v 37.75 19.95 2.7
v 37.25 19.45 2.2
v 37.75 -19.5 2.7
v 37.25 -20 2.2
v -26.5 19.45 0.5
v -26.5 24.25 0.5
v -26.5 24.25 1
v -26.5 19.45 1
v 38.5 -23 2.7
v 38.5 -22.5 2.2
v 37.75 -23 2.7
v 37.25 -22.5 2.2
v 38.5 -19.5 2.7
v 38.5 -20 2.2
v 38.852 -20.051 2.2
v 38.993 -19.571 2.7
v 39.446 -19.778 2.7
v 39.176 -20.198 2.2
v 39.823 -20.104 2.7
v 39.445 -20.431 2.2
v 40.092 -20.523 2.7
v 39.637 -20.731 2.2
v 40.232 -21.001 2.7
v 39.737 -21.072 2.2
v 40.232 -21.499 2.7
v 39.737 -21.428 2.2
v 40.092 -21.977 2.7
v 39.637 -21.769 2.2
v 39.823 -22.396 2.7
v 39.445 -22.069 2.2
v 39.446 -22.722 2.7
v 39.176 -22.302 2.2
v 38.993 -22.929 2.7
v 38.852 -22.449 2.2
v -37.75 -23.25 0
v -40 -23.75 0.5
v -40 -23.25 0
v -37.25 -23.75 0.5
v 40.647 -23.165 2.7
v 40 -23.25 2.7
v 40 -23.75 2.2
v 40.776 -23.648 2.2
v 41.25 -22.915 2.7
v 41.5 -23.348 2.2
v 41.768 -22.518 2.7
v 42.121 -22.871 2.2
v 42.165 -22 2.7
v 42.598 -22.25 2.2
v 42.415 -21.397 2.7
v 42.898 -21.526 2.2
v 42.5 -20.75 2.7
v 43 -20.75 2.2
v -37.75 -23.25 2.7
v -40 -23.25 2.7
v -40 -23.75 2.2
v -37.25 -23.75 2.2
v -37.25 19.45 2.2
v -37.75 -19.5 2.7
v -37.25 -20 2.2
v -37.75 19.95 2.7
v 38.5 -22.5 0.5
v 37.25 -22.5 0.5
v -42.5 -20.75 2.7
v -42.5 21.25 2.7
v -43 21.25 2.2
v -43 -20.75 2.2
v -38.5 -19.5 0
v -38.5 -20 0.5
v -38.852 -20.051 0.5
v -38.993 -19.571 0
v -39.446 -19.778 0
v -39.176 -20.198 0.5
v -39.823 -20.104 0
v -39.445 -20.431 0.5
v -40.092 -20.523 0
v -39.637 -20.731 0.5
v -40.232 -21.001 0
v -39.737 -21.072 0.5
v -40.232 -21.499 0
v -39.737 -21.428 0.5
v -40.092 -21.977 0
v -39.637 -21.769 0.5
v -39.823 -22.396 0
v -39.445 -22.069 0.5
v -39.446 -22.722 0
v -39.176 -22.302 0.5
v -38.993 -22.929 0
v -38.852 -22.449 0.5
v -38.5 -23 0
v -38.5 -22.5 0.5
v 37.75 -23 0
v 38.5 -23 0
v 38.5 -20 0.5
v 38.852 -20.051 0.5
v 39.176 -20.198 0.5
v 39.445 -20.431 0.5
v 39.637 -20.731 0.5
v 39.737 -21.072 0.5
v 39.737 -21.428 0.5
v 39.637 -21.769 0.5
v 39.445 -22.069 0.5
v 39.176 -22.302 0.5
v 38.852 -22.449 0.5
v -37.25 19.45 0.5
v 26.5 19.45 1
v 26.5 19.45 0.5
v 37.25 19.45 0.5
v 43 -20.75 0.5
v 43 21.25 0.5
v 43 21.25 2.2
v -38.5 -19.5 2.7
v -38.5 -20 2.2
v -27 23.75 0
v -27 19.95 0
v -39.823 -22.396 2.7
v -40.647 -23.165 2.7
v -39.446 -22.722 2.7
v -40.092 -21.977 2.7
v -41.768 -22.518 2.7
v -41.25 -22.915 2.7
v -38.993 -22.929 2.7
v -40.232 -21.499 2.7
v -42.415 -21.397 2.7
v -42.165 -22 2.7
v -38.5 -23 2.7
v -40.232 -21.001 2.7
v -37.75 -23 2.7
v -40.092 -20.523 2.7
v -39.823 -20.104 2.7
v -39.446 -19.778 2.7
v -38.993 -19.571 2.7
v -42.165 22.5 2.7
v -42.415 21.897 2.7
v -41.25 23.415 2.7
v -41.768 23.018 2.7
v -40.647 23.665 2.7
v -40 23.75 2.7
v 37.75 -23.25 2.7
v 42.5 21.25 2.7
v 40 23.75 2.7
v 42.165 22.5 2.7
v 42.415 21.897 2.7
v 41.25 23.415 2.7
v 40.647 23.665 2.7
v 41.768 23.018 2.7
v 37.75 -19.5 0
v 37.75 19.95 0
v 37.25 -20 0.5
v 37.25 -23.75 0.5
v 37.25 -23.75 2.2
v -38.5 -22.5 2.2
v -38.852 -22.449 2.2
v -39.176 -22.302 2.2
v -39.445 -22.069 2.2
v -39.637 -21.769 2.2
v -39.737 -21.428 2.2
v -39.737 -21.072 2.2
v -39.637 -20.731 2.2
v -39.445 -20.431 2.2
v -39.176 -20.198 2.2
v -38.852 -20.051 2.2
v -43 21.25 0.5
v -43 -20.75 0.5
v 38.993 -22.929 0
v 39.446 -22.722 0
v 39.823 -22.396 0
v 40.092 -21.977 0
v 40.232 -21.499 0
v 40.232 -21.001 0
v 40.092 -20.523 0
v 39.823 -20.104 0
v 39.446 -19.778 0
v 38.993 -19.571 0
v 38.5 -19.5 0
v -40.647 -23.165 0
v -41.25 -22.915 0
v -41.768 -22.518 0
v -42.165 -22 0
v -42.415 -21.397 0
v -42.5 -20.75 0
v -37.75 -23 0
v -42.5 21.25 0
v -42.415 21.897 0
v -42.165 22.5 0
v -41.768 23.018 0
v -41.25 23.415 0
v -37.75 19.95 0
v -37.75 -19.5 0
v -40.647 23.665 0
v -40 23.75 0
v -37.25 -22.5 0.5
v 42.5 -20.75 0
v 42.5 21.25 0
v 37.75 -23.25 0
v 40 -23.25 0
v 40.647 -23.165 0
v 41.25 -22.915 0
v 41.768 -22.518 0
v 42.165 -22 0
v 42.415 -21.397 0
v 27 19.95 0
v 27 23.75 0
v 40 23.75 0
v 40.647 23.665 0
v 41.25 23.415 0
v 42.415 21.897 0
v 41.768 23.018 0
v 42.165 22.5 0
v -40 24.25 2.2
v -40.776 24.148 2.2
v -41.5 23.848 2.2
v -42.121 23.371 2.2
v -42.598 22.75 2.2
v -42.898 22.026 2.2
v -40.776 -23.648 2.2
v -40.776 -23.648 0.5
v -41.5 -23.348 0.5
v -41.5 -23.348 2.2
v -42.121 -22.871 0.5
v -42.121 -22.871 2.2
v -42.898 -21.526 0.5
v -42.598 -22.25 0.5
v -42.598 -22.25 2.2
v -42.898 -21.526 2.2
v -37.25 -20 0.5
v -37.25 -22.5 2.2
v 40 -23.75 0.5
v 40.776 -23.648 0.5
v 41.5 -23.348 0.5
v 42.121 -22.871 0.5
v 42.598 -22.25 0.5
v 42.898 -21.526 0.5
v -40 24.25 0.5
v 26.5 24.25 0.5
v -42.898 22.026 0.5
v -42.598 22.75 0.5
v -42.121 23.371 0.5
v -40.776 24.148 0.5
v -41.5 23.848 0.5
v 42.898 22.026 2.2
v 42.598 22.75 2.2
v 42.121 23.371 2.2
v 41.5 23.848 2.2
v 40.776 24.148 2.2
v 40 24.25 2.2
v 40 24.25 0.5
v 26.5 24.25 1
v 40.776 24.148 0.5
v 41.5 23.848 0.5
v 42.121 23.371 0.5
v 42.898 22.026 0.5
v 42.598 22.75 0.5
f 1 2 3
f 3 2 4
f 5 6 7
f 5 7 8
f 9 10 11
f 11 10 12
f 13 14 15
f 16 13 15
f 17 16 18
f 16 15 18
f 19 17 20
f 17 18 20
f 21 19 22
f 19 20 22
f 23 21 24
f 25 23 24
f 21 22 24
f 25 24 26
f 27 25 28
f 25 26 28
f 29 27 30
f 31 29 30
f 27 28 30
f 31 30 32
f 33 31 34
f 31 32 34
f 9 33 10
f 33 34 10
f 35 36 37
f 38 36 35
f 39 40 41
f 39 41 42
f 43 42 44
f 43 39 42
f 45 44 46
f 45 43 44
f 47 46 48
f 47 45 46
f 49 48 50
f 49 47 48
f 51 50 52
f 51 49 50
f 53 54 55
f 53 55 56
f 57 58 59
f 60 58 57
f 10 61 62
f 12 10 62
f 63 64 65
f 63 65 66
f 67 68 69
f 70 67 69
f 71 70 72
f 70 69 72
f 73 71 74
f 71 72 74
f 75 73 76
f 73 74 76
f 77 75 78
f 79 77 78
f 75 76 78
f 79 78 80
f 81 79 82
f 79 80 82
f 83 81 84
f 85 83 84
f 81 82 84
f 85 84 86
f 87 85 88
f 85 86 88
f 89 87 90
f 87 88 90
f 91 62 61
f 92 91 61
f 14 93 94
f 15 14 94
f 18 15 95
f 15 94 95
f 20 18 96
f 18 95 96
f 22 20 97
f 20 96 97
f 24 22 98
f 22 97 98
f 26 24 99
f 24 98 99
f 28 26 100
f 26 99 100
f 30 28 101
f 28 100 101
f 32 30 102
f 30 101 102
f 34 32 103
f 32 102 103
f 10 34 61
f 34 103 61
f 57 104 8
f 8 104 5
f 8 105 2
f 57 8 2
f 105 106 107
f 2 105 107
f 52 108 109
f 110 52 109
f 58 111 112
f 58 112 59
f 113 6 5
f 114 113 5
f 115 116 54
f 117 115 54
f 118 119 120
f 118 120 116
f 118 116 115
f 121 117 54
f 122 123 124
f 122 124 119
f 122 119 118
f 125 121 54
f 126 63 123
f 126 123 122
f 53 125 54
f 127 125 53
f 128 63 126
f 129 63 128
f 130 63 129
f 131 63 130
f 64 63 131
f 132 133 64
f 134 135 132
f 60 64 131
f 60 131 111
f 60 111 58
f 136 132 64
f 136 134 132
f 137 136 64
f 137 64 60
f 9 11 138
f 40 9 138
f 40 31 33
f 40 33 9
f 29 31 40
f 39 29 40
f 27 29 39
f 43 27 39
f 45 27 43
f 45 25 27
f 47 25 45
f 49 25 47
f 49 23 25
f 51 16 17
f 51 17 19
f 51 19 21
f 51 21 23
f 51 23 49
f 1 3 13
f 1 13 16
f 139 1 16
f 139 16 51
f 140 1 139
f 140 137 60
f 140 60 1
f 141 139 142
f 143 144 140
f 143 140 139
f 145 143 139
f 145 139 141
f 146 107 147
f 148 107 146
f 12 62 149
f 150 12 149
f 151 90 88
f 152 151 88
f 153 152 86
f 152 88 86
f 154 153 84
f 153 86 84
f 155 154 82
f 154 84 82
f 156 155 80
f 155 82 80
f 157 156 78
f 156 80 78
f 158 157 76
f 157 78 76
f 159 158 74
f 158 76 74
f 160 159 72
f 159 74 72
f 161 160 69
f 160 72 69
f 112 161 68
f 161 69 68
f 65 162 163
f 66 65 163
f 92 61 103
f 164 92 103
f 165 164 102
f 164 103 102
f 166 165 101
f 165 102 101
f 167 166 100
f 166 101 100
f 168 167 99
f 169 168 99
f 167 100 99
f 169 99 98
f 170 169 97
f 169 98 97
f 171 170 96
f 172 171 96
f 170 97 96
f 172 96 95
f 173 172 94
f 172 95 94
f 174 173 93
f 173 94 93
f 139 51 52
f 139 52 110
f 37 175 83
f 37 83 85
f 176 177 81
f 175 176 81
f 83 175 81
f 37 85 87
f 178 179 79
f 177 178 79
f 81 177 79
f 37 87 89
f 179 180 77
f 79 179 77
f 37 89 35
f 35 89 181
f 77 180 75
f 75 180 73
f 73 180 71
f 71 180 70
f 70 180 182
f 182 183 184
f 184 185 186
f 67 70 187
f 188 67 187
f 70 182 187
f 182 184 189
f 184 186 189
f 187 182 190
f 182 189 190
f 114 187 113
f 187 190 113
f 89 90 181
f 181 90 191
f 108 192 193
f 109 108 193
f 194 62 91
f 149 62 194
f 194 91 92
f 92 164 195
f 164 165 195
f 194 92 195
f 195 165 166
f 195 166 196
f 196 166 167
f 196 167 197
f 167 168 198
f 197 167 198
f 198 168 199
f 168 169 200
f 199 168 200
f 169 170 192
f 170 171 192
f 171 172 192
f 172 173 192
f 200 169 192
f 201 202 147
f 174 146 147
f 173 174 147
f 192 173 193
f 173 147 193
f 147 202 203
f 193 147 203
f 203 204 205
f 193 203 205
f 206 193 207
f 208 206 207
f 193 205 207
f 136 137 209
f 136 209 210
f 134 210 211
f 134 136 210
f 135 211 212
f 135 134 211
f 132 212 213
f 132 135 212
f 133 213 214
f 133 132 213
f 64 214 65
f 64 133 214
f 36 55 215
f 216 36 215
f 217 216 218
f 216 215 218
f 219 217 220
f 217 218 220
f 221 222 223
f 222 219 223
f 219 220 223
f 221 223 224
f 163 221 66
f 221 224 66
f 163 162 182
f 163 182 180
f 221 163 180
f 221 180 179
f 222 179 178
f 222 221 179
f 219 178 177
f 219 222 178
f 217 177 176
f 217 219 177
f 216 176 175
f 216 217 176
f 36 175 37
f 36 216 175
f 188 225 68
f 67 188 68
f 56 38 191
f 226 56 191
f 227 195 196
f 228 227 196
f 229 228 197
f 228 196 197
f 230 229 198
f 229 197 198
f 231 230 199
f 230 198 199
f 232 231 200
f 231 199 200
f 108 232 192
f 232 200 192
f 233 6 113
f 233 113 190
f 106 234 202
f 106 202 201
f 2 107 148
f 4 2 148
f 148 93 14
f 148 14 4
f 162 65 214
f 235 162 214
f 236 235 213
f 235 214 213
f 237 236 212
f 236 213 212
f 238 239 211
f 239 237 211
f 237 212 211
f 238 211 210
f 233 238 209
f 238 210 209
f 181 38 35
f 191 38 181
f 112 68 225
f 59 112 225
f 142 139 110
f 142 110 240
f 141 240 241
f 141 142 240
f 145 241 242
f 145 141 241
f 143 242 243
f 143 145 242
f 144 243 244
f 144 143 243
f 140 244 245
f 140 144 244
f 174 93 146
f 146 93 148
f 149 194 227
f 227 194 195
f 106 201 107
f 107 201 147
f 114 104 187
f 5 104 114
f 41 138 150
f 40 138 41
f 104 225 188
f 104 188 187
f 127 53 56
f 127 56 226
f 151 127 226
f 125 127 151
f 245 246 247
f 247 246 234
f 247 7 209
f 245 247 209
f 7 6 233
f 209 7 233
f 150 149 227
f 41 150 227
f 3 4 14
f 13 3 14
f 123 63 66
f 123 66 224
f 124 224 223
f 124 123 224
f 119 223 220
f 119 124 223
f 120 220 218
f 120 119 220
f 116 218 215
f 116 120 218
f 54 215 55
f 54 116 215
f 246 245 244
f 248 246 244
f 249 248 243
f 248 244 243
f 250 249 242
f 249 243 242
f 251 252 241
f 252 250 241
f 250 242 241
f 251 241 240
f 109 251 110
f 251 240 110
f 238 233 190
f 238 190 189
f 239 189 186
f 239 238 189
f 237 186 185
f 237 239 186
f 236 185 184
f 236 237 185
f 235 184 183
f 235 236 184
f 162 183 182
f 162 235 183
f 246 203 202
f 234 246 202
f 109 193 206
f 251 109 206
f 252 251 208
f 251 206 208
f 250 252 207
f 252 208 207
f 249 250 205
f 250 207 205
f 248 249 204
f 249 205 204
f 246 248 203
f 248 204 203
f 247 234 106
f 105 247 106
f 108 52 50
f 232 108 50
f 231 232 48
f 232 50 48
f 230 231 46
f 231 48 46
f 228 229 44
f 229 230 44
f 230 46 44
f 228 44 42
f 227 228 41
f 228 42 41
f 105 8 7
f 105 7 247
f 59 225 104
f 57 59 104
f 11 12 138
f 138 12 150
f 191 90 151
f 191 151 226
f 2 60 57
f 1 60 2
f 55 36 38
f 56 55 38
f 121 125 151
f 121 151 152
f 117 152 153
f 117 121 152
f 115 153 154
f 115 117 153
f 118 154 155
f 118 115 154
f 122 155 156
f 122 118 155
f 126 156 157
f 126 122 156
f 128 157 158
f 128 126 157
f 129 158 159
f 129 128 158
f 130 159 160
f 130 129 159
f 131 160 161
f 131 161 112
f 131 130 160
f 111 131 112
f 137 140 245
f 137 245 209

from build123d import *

# Parameters (mm, degrees)
PAD_DEPTH       = 2.7
SKETCH002_W     = 53
SKETCH002_H     = 6
POCKET_DEPTH    = 1
POCKET001_DEPTH = 2.701
FILLET_R        = 3
CHAMFER_SIZE    = 0.5


with BuildPart() as part:
    # Sketch001 → Pad (new body)
    with BuildSketch(Plane.XY):
        Polygon((-37.25, -23.75), (-37.25, 19.45), (37.25, 19.45), (37.25, -23.75), (43, -23.75), (43, 24.25), (-43, 24.25), (-43, -23.75), align=None)
    extrude(amount=PAD_DEPTH)

    # Sketch002 (on Face9 of Pad) → Pocket (cut)
    with BuildSketch(Plane(origin=(0, 0, 0), x_dir=(1, 0, 0), z_dir=(0, 0, -1))):
        with Locations((0, -21.905725)):
            Rectangle(SKETCH002_W, SKETCH002_H)
    extrude(amount=-POCKET_DEPTH, mode=Mode.SUBTRACT)

    # Sketch003 (on Face4 of Pocket) → Pocket001 (cut, through all)
    with BuildSketch(Plane(origin=(0, 0, 0), x_dir=(1, 0, 0), z_dir=(0, 0, -1))):
        with BuildLine():
            ThreePointArc((38.5, 20), (39.75, 21.25), (38.5, 22.5))
            Line((38.5, 22.5), (36, 22.5))
            Line((36, 22.5), (36, 20))
            Line((38.5, 20), (36, 20))
        make_face()
        with BuildLine():
            ThreePointArc((-38.5, 22.5), (-39.75, 21.25), (-38.5, 20))
            Line((-38.5, 20), (-36, 20))
            Line((-36, 22.5), (-36, 20))
            Line((-38.5, 22.5), (-36, 22.5))
        make_face()
    extrude(amount=-POCKET001_DEPTH, mode=Mode.SUBTRACT)

    # Fillet
    fillet_edges = [part.edges().sort_by_distance(p)[0] for p in [
        (43, -23.75, 1.35),
        (43, 24.25, 1.35),
        (-43, 24.25, 1.35),
        (-43, -23.75, 1.35),
    ]]
    fillet(fillet_edges, radius=FILLET_R)

    # Chamfer
    chamfer_edges = [part.edges().sort_by_distance(p)[0] for p in [
        (-43, 0.25, 0),
        (-42.12132, 23.37132, 0),
        (-42.12132, -22.87132, 0),
        (-33.25, 24.25, 0),
        (-38.625, -23.75, 0),
        (-26.5, 21.85, 0),
        (-37.25, -23.125, 0),
        (-31.875, 19.45, 0),
        (-37.875, -22.5, 0),
        (-37.25, -0.275, 0),
        (-39.75, -21.25, 0),
        (-37.875, -20, 0),
        (33.25, 24.25, 0),
        (42.12132, 23.37132, 0),
        (26.5, 21.85, 0),
        (43, 0.25, 0),
        (31.875, 19.45, 0),
        (42.12132, -22.87132, 0),
        (37.25, -0.275, 0),
        (38.625, -23.75, 0),
        (37.875, -20, 0),
        (37.25, -23.125, 0),
        (39.75, -21.25, 0),
        (37.875, -22.5, 0),
        (-38.625, -23.75, 2.7),
        (-42.12132, -22.87132, 2.7),
        (-37.25, -23.125, 2.7),
        (-43, 0.25, 2.7),
        (-37.875, -22.5, 2.7),
        (-42.12132, 23.37132, 2.7),
        (-39.75, -21.25, 2.7),
        (0, 24.25, 2.7),
        (-37.875, -20, 2.7),
        (42.12132, 23.37132, 2.7),
        (-37.25, -0.275, 2.7),
        (43, 0.25, 2.7),
        (0, 19.45, 2.7),
        (42.12132, -22.87132, 2.7),
        (37.25, -0.275, 2.7),
        (38.625, -23.75, 2.7),
        (37.875, -20, 2.7),
        (37.25, -23.125, 2.7),
        (39.75, -21.25, 2.7),
        (37.875, -22.5, 2.7),
    ]]
    chamfer(chamfer_edges, length=CHAMFER_SIZE)


solid = part.part
